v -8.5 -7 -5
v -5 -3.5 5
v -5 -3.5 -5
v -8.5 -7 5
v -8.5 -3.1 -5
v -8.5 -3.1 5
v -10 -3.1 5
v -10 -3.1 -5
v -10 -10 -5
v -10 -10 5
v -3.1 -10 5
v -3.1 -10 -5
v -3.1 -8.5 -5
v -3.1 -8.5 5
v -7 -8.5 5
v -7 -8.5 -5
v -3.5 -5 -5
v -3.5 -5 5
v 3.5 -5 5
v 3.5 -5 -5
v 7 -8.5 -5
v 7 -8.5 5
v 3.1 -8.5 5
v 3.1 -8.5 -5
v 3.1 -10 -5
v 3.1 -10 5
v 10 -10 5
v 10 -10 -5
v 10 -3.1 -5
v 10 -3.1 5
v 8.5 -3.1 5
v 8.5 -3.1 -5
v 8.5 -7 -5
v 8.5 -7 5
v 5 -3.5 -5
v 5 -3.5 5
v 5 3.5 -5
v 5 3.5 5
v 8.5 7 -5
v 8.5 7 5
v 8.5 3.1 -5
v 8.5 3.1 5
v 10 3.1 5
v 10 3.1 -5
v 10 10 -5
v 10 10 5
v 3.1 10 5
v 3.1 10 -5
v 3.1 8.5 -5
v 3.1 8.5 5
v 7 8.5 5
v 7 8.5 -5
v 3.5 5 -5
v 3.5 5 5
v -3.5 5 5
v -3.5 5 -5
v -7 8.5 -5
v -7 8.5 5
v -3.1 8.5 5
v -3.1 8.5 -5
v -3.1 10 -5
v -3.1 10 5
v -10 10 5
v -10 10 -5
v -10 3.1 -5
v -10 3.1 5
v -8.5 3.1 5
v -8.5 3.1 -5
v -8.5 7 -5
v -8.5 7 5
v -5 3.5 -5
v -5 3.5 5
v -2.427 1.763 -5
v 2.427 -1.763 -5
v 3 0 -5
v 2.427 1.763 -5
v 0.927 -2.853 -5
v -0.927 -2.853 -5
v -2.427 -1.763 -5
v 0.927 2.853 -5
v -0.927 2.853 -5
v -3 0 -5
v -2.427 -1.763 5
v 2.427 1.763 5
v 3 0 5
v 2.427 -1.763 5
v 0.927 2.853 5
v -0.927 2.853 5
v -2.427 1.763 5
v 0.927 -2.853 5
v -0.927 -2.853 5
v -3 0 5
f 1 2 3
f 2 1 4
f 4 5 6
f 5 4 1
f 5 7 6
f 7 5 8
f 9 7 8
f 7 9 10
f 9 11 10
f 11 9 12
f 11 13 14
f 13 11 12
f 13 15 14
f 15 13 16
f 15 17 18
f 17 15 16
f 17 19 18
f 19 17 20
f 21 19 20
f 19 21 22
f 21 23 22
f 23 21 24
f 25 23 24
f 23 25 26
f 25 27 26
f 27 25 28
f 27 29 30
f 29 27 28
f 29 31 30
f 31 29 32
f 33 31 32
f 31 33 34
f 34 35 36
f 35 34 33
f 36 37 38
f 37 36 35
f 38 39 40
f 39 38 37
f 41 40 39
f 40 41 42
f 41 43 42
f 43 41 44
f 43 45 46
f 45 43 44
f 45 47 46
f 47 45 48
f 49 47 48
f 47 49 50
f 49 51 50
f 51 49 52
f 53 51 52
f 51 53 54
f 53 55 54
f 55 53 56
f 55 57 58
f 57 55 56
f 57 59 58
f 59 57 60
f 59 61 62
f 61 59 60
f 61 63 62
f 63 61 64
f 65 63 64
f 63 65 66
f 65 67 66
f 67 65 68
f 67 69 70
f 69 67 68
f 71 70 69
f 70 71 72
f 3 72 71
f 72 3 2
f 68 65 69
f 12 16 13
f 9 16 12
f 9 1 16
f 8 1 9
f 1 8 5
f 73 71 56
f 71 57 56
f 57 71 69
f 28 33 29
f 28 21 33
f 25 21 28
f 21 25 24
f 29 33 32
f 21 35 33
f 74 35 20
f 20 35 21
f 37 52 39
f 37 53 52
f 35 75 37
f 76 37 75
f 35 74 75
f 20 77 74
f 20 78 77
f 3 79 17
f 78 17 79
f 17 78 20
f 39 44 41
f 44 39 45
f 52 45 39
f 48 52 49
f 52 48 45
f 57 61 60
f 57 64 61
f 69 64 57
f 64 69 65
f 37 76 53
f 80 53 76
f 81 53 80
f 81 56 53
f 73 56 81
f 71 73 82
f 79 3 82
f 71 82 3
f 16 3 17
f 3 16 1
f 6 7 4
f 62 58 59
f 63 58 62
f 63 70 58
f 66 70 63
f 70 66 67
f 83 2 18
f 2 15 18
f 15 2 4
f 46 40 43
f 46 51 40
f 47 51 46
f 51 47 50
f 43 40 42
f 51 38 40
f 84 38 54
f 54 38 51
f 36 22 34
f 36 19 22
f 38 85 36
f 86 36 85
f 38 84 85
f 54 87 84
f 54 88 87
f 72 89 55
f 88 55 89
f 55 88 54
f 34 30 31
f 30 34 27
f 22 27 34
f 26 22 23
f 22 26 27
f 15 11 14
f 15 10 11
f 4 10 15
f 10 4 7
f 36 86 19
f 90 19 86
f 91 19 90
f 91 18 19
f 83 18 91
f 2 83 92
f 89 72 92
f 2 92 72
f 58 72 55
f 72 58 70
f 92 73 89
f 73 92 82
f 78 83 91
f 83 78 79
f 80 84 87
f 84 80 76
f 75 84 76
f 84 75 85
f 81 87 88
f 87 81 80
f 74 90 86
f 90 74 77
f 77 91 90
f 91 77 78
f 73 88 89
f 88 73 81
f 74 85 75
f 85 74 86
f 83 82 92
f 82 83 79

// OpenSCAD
module extrusion(sidelen, 
                 height, 
                 notch, 
                 thickness, 
                 center_diameter,
                 center_sidelen, 
                 long_base, 
                 center=false) {
    short_base = long_base - (sidelen - center_sidelen - thickness * 2);

    module constructor() {
        difference() {        
            polyhedron(
                points=[
                    // 0
                    [0, 0, 0],

                    // 1
                    [(sidelen - notch) / 2, 0, 0], 
                    // 2
                    [(sidelen - notch) / 2, thickness, 0], 
                    // 3
                    [(sidelen - long_base) / 2, thickness, 0], 
                    // 4
                    [(sidelen - short_base) / 2, (sidelen - center_sidelen) / 2, 0],

                    // 5
                    [sidelen - (sidelen - short_base) / 2, (sidelen - center_sidelen) / 2, 0],
                    // 6
                    [sidelen - (sidelen - long_base) / 2, thickness, 0],
                    // 7
                    [sidelen - (sidelen - notch) / 2, thickness, 0],
                    // 8
                    [sidelen - (sidelen - notch) / 2, 0, 0],

                    // 9
                    [sidelen, 0, 0],

                    // 10
                    [sidelen, (sidelen - notch) / 2, 0],
                    // 11
                    [sidelen - thickness, (sidelen - notch) / 2, 0],
                    // 12
                    [sidelen - thickness, (sidelen - long_base) / 2, 0],
                    // 13
                    [sidelen - (sidelen - center_sidelen) / 2, (sidelen - short_base) / 2, 0],

                    // 14
                    [sidelen - (sidelen - center_sidelen) / 2, sidelen - (sidelen - short_base) / 2, 0],
                    // 15
                    [sidelen - thickness, sidelen - (sidelen - long_base) / 2, 0],
                    // 16
                    [sidelen - thickness, sidelen - (sidelen - notch) / 2, 0],
                    // 17
                    [sidelen, sidelen - (sidelen - notch) / 2, 0],

                    // 18
                    [sidelen, sidelen, 0],

                    // 19
                    [sidelen - (sidelen - notch) / 2, sidelen, 0],
                    // 20
                    [sidelen - (sidelen - notch) / 2, sidelen - thickness, 0],
                    // 21
                    [sidelen - (sidelen - long_base) / 2, sidelen - thickness, 0],
                    // 22
                    [sidelen - (sidelen - short_base) / 2, sidelen - (sidelen - center_sidelen) / 2, 0],

                    // 23
                    [(sidelen - short_base) / 2, sidelen - (sidelen - center_sidelen) / 2, 0],
                    // 24
                    [(sidelen - long_base) / 2, sidelen - thickness, 0],
                    // 25
                    [(sidelen - notch) / 2, sidelen - thickness, 0],
                    // 26
                    [(sidelen - notch) / 2, sidelen, 0],

                    // 27
                    [0, sidelen, 0],

                    // 28
                    [0, sidelen - (sidelen - notch) / 2, 0],
                    // 29
                    [thickness, sidelen - (sidelen - notch) / 2, 0],
                    // 30
                    [thickness, sidelen - (sidelen - long_base) / 2, 0],
                    // 31
                    [(sidelen - center_sidelen) / 2, sidelen - (sidelen - short_base) / 2, 0],

                    // 32
                    [(sidelen - center_sidelen) / 2, (sidelen - short_base) / 2, 0],
                    // 33
                    [thickness, (sidelen - long_base) / 2, 0],
                    // 34
                    [thickness, (sidelen - notch) / 2, 0],
                    // 35
                    [0, (sidelen - notch) / 2, 0],



                    // 36
                    [0, 0, height], 

                    // 37
                    [(sidelen - notch) / 2, 0, height],
                    // 38
                    [(sidelen - notch) / 2, thickness, height],
                    // 39
                    [(sidelen - long_base) / 2, thickness, height],
                    // 40
                    [(sidelen - short_base) / 2, (sidelen - center_sidelen) / 2, height],

                    // 41
                    [sidelen - (sidelen - short_base) / 2, (sidelen - center_sidelen) / 2, height],
                    // 42
                    [sidelen - (sidelen - long_base) / 2, thickness, height],
                    // 43
                    [sidelen - (sidelen - notch) / 2, thickness, height],
                    // 44
                    [sidelen - (sidelen - notch) / 2, 0, height],

                    // 45
                    [sidelen, 0, height],

                    // 46
                    [sidelen, (sidelen - notch) / 2, height],
                    // 47
                    [sidelen - thickness, (sidelen - notch) / 2, height],
                    // 48
                    [sidelen - thickness, (sidelen - long_base) / 2, height],
                    // 49
                    [sidelen - (sidelen - center_sidelen) / 2, (sidelen - short_base) / 2, height],

                    // 50
                    [sidelen - (sidelen - center_sidelen) / 2, sidelen - (sidelen - short_base) / 2, height],
                    // 51
                    [sidelen - thickness, sidelen - (sidelen - long_base) / 2, height],
                    // 52
                    [sidelen - thickness, sidelen - (sidelen - notch) / 2, height],
                    // 53
                    [sidelen, sidelen - (sidelen - notch) / 2, height],

                    // 54
                    [sidelen, sidelen, height],

                    // 55
                    [sidelen - (sidelen - notch) / 2, sidelen, height],
                    // 56
                    [sidelen - (sidelen - notch) / 2, sidelen - thickness, height],
                    // 57
                    [sidelen - (sidelen - long_base) / 2, sidelen - thickness, height],
                    // 58
                    [sidelen - (sidelen - short_base) / 2, sidelen - (sidelen - center_sidelen) / 2, height],

                    // 59            translate([posx, posy, 0]) {
                    [(sidelen - short_base) / 2, sidelen - (sidelen - center_sidelen) / 2, height],
                    // 60
                    [(sidelen - long_base) / 2, sidelen - thickness, height],
                    // 61
                    [(sidelen - notch) / 2, sidelen - thickness, height],
                    // 62
                    [(sidelen - notch) / 2, sidelen, height],

                    // 63
                    [0, sidelen, height],

                    // 64
                    [0, sidelen - (sidelen - notch) / 2, height],
                    // 65
                    [thickness, sidelen - (sidelen - notch) / 2, height],
                    // 66
                    [thickness, sidelen - (sidelen - long_base) / 2, height],
                    // 67
                    [(sidelen - center_sidelen) / 2, sidelen - (sidelen - short_base) / 2, height],

                    // 68
                    [(sidelen - center_sidelen) / 2, (sidelen - short_base) / 2, height],
                    // 69
                    [thickness, (sidelen - long_base) / 2, height],
                    // 70
                    [thickness, (sidelen - notch) / 2, height],
                    // 71
                    [0, (sidelen - notch) / 2, height],
                ],
                faces = [
                    [68, 69, 33, 32],
                    [69, 70, 34, 33],
                    [70, 71, 35, 34],
                    [71, 36, 0, 35],
                    [36, 37, 1, 0],
                    [37, 38, 2, 1],
                    [38, 39, 3, 2],
                    [39, 40, 4, 3],

                    [40, 41, 5, 4],

                    [41, 42, 6, 5],
                    [42, 43, 7, 6],
                    [43, 44, 8, 7],
                    [44, 45, 9, 8],
                    [45, 46, 10, 9],
                    [46, 47, 11, 10],
                    [47, 48, 12, 11],
                    [48, 49, 13, 12],

                    [49, 50, 14, 13],

                    [50, 51, 15, 14],
                    [51, 52, 16, 15],
                    [52, 53, 17, 16],
                    [53, 54, 18, 17],
                    [54, 55, 19, 18],
                    [55, 56, 20, 19],
                    [56, 57, 21, 20],
                    [57, 58, 22, 21],

                    [58, 59, 23, 22],

                    [59, 60, 24, 23],
                    [60, 61, 25, 24],
                    [61, 62, 26, 25],
                    [62, 63, 27, 26],
                    [63, 64, 28, 27],
                    [64, 65, 29, 28],
                    [65, 66, 30, 29],
                    [66, 67, 31, 30],

                    [67, 68, 32, 31],

                    [0, 1, 2, 3, 4, 5, 6, 7, 8, 
                    9, 10, 11, 12, 13, 14, 15, 16, 17, 
                    18, 19, 20, 21, 22, 23, 24, 25, 26, 
                    27, 28, 29, 30, 31, 32, 33, 34, 35],

                    [71, 70, 69, 68, 67, 66, 65, 64, 63, 
                    62, 61, 60, 59, 58, 57, 56, 55, 54,
                    53, 52, 51, 50, 49, 48, 47, 46, 45,
                    44, 43, 42, 41, 40, 39, 38, 37, 36],
                ]
            );
            translate([sidelen / 2, sidelen / 2, height / 2]) {
                cylinder(height, d=center_diameter, center=true);
            }
        }
    }

    if (center) {
        translate([-sidelen / 2, -sidelen / 2, -height / 2]) {
            constructor();
        }
    } else {
        constructor();
    }      
}


extrusion(sidelen=20, 
          height=10, 
          notch=6.2, 
          thickness=1.5, 
          center_diameter=6.0, 
          center_sidelen=10,
          long_base=14,
          center=true);
